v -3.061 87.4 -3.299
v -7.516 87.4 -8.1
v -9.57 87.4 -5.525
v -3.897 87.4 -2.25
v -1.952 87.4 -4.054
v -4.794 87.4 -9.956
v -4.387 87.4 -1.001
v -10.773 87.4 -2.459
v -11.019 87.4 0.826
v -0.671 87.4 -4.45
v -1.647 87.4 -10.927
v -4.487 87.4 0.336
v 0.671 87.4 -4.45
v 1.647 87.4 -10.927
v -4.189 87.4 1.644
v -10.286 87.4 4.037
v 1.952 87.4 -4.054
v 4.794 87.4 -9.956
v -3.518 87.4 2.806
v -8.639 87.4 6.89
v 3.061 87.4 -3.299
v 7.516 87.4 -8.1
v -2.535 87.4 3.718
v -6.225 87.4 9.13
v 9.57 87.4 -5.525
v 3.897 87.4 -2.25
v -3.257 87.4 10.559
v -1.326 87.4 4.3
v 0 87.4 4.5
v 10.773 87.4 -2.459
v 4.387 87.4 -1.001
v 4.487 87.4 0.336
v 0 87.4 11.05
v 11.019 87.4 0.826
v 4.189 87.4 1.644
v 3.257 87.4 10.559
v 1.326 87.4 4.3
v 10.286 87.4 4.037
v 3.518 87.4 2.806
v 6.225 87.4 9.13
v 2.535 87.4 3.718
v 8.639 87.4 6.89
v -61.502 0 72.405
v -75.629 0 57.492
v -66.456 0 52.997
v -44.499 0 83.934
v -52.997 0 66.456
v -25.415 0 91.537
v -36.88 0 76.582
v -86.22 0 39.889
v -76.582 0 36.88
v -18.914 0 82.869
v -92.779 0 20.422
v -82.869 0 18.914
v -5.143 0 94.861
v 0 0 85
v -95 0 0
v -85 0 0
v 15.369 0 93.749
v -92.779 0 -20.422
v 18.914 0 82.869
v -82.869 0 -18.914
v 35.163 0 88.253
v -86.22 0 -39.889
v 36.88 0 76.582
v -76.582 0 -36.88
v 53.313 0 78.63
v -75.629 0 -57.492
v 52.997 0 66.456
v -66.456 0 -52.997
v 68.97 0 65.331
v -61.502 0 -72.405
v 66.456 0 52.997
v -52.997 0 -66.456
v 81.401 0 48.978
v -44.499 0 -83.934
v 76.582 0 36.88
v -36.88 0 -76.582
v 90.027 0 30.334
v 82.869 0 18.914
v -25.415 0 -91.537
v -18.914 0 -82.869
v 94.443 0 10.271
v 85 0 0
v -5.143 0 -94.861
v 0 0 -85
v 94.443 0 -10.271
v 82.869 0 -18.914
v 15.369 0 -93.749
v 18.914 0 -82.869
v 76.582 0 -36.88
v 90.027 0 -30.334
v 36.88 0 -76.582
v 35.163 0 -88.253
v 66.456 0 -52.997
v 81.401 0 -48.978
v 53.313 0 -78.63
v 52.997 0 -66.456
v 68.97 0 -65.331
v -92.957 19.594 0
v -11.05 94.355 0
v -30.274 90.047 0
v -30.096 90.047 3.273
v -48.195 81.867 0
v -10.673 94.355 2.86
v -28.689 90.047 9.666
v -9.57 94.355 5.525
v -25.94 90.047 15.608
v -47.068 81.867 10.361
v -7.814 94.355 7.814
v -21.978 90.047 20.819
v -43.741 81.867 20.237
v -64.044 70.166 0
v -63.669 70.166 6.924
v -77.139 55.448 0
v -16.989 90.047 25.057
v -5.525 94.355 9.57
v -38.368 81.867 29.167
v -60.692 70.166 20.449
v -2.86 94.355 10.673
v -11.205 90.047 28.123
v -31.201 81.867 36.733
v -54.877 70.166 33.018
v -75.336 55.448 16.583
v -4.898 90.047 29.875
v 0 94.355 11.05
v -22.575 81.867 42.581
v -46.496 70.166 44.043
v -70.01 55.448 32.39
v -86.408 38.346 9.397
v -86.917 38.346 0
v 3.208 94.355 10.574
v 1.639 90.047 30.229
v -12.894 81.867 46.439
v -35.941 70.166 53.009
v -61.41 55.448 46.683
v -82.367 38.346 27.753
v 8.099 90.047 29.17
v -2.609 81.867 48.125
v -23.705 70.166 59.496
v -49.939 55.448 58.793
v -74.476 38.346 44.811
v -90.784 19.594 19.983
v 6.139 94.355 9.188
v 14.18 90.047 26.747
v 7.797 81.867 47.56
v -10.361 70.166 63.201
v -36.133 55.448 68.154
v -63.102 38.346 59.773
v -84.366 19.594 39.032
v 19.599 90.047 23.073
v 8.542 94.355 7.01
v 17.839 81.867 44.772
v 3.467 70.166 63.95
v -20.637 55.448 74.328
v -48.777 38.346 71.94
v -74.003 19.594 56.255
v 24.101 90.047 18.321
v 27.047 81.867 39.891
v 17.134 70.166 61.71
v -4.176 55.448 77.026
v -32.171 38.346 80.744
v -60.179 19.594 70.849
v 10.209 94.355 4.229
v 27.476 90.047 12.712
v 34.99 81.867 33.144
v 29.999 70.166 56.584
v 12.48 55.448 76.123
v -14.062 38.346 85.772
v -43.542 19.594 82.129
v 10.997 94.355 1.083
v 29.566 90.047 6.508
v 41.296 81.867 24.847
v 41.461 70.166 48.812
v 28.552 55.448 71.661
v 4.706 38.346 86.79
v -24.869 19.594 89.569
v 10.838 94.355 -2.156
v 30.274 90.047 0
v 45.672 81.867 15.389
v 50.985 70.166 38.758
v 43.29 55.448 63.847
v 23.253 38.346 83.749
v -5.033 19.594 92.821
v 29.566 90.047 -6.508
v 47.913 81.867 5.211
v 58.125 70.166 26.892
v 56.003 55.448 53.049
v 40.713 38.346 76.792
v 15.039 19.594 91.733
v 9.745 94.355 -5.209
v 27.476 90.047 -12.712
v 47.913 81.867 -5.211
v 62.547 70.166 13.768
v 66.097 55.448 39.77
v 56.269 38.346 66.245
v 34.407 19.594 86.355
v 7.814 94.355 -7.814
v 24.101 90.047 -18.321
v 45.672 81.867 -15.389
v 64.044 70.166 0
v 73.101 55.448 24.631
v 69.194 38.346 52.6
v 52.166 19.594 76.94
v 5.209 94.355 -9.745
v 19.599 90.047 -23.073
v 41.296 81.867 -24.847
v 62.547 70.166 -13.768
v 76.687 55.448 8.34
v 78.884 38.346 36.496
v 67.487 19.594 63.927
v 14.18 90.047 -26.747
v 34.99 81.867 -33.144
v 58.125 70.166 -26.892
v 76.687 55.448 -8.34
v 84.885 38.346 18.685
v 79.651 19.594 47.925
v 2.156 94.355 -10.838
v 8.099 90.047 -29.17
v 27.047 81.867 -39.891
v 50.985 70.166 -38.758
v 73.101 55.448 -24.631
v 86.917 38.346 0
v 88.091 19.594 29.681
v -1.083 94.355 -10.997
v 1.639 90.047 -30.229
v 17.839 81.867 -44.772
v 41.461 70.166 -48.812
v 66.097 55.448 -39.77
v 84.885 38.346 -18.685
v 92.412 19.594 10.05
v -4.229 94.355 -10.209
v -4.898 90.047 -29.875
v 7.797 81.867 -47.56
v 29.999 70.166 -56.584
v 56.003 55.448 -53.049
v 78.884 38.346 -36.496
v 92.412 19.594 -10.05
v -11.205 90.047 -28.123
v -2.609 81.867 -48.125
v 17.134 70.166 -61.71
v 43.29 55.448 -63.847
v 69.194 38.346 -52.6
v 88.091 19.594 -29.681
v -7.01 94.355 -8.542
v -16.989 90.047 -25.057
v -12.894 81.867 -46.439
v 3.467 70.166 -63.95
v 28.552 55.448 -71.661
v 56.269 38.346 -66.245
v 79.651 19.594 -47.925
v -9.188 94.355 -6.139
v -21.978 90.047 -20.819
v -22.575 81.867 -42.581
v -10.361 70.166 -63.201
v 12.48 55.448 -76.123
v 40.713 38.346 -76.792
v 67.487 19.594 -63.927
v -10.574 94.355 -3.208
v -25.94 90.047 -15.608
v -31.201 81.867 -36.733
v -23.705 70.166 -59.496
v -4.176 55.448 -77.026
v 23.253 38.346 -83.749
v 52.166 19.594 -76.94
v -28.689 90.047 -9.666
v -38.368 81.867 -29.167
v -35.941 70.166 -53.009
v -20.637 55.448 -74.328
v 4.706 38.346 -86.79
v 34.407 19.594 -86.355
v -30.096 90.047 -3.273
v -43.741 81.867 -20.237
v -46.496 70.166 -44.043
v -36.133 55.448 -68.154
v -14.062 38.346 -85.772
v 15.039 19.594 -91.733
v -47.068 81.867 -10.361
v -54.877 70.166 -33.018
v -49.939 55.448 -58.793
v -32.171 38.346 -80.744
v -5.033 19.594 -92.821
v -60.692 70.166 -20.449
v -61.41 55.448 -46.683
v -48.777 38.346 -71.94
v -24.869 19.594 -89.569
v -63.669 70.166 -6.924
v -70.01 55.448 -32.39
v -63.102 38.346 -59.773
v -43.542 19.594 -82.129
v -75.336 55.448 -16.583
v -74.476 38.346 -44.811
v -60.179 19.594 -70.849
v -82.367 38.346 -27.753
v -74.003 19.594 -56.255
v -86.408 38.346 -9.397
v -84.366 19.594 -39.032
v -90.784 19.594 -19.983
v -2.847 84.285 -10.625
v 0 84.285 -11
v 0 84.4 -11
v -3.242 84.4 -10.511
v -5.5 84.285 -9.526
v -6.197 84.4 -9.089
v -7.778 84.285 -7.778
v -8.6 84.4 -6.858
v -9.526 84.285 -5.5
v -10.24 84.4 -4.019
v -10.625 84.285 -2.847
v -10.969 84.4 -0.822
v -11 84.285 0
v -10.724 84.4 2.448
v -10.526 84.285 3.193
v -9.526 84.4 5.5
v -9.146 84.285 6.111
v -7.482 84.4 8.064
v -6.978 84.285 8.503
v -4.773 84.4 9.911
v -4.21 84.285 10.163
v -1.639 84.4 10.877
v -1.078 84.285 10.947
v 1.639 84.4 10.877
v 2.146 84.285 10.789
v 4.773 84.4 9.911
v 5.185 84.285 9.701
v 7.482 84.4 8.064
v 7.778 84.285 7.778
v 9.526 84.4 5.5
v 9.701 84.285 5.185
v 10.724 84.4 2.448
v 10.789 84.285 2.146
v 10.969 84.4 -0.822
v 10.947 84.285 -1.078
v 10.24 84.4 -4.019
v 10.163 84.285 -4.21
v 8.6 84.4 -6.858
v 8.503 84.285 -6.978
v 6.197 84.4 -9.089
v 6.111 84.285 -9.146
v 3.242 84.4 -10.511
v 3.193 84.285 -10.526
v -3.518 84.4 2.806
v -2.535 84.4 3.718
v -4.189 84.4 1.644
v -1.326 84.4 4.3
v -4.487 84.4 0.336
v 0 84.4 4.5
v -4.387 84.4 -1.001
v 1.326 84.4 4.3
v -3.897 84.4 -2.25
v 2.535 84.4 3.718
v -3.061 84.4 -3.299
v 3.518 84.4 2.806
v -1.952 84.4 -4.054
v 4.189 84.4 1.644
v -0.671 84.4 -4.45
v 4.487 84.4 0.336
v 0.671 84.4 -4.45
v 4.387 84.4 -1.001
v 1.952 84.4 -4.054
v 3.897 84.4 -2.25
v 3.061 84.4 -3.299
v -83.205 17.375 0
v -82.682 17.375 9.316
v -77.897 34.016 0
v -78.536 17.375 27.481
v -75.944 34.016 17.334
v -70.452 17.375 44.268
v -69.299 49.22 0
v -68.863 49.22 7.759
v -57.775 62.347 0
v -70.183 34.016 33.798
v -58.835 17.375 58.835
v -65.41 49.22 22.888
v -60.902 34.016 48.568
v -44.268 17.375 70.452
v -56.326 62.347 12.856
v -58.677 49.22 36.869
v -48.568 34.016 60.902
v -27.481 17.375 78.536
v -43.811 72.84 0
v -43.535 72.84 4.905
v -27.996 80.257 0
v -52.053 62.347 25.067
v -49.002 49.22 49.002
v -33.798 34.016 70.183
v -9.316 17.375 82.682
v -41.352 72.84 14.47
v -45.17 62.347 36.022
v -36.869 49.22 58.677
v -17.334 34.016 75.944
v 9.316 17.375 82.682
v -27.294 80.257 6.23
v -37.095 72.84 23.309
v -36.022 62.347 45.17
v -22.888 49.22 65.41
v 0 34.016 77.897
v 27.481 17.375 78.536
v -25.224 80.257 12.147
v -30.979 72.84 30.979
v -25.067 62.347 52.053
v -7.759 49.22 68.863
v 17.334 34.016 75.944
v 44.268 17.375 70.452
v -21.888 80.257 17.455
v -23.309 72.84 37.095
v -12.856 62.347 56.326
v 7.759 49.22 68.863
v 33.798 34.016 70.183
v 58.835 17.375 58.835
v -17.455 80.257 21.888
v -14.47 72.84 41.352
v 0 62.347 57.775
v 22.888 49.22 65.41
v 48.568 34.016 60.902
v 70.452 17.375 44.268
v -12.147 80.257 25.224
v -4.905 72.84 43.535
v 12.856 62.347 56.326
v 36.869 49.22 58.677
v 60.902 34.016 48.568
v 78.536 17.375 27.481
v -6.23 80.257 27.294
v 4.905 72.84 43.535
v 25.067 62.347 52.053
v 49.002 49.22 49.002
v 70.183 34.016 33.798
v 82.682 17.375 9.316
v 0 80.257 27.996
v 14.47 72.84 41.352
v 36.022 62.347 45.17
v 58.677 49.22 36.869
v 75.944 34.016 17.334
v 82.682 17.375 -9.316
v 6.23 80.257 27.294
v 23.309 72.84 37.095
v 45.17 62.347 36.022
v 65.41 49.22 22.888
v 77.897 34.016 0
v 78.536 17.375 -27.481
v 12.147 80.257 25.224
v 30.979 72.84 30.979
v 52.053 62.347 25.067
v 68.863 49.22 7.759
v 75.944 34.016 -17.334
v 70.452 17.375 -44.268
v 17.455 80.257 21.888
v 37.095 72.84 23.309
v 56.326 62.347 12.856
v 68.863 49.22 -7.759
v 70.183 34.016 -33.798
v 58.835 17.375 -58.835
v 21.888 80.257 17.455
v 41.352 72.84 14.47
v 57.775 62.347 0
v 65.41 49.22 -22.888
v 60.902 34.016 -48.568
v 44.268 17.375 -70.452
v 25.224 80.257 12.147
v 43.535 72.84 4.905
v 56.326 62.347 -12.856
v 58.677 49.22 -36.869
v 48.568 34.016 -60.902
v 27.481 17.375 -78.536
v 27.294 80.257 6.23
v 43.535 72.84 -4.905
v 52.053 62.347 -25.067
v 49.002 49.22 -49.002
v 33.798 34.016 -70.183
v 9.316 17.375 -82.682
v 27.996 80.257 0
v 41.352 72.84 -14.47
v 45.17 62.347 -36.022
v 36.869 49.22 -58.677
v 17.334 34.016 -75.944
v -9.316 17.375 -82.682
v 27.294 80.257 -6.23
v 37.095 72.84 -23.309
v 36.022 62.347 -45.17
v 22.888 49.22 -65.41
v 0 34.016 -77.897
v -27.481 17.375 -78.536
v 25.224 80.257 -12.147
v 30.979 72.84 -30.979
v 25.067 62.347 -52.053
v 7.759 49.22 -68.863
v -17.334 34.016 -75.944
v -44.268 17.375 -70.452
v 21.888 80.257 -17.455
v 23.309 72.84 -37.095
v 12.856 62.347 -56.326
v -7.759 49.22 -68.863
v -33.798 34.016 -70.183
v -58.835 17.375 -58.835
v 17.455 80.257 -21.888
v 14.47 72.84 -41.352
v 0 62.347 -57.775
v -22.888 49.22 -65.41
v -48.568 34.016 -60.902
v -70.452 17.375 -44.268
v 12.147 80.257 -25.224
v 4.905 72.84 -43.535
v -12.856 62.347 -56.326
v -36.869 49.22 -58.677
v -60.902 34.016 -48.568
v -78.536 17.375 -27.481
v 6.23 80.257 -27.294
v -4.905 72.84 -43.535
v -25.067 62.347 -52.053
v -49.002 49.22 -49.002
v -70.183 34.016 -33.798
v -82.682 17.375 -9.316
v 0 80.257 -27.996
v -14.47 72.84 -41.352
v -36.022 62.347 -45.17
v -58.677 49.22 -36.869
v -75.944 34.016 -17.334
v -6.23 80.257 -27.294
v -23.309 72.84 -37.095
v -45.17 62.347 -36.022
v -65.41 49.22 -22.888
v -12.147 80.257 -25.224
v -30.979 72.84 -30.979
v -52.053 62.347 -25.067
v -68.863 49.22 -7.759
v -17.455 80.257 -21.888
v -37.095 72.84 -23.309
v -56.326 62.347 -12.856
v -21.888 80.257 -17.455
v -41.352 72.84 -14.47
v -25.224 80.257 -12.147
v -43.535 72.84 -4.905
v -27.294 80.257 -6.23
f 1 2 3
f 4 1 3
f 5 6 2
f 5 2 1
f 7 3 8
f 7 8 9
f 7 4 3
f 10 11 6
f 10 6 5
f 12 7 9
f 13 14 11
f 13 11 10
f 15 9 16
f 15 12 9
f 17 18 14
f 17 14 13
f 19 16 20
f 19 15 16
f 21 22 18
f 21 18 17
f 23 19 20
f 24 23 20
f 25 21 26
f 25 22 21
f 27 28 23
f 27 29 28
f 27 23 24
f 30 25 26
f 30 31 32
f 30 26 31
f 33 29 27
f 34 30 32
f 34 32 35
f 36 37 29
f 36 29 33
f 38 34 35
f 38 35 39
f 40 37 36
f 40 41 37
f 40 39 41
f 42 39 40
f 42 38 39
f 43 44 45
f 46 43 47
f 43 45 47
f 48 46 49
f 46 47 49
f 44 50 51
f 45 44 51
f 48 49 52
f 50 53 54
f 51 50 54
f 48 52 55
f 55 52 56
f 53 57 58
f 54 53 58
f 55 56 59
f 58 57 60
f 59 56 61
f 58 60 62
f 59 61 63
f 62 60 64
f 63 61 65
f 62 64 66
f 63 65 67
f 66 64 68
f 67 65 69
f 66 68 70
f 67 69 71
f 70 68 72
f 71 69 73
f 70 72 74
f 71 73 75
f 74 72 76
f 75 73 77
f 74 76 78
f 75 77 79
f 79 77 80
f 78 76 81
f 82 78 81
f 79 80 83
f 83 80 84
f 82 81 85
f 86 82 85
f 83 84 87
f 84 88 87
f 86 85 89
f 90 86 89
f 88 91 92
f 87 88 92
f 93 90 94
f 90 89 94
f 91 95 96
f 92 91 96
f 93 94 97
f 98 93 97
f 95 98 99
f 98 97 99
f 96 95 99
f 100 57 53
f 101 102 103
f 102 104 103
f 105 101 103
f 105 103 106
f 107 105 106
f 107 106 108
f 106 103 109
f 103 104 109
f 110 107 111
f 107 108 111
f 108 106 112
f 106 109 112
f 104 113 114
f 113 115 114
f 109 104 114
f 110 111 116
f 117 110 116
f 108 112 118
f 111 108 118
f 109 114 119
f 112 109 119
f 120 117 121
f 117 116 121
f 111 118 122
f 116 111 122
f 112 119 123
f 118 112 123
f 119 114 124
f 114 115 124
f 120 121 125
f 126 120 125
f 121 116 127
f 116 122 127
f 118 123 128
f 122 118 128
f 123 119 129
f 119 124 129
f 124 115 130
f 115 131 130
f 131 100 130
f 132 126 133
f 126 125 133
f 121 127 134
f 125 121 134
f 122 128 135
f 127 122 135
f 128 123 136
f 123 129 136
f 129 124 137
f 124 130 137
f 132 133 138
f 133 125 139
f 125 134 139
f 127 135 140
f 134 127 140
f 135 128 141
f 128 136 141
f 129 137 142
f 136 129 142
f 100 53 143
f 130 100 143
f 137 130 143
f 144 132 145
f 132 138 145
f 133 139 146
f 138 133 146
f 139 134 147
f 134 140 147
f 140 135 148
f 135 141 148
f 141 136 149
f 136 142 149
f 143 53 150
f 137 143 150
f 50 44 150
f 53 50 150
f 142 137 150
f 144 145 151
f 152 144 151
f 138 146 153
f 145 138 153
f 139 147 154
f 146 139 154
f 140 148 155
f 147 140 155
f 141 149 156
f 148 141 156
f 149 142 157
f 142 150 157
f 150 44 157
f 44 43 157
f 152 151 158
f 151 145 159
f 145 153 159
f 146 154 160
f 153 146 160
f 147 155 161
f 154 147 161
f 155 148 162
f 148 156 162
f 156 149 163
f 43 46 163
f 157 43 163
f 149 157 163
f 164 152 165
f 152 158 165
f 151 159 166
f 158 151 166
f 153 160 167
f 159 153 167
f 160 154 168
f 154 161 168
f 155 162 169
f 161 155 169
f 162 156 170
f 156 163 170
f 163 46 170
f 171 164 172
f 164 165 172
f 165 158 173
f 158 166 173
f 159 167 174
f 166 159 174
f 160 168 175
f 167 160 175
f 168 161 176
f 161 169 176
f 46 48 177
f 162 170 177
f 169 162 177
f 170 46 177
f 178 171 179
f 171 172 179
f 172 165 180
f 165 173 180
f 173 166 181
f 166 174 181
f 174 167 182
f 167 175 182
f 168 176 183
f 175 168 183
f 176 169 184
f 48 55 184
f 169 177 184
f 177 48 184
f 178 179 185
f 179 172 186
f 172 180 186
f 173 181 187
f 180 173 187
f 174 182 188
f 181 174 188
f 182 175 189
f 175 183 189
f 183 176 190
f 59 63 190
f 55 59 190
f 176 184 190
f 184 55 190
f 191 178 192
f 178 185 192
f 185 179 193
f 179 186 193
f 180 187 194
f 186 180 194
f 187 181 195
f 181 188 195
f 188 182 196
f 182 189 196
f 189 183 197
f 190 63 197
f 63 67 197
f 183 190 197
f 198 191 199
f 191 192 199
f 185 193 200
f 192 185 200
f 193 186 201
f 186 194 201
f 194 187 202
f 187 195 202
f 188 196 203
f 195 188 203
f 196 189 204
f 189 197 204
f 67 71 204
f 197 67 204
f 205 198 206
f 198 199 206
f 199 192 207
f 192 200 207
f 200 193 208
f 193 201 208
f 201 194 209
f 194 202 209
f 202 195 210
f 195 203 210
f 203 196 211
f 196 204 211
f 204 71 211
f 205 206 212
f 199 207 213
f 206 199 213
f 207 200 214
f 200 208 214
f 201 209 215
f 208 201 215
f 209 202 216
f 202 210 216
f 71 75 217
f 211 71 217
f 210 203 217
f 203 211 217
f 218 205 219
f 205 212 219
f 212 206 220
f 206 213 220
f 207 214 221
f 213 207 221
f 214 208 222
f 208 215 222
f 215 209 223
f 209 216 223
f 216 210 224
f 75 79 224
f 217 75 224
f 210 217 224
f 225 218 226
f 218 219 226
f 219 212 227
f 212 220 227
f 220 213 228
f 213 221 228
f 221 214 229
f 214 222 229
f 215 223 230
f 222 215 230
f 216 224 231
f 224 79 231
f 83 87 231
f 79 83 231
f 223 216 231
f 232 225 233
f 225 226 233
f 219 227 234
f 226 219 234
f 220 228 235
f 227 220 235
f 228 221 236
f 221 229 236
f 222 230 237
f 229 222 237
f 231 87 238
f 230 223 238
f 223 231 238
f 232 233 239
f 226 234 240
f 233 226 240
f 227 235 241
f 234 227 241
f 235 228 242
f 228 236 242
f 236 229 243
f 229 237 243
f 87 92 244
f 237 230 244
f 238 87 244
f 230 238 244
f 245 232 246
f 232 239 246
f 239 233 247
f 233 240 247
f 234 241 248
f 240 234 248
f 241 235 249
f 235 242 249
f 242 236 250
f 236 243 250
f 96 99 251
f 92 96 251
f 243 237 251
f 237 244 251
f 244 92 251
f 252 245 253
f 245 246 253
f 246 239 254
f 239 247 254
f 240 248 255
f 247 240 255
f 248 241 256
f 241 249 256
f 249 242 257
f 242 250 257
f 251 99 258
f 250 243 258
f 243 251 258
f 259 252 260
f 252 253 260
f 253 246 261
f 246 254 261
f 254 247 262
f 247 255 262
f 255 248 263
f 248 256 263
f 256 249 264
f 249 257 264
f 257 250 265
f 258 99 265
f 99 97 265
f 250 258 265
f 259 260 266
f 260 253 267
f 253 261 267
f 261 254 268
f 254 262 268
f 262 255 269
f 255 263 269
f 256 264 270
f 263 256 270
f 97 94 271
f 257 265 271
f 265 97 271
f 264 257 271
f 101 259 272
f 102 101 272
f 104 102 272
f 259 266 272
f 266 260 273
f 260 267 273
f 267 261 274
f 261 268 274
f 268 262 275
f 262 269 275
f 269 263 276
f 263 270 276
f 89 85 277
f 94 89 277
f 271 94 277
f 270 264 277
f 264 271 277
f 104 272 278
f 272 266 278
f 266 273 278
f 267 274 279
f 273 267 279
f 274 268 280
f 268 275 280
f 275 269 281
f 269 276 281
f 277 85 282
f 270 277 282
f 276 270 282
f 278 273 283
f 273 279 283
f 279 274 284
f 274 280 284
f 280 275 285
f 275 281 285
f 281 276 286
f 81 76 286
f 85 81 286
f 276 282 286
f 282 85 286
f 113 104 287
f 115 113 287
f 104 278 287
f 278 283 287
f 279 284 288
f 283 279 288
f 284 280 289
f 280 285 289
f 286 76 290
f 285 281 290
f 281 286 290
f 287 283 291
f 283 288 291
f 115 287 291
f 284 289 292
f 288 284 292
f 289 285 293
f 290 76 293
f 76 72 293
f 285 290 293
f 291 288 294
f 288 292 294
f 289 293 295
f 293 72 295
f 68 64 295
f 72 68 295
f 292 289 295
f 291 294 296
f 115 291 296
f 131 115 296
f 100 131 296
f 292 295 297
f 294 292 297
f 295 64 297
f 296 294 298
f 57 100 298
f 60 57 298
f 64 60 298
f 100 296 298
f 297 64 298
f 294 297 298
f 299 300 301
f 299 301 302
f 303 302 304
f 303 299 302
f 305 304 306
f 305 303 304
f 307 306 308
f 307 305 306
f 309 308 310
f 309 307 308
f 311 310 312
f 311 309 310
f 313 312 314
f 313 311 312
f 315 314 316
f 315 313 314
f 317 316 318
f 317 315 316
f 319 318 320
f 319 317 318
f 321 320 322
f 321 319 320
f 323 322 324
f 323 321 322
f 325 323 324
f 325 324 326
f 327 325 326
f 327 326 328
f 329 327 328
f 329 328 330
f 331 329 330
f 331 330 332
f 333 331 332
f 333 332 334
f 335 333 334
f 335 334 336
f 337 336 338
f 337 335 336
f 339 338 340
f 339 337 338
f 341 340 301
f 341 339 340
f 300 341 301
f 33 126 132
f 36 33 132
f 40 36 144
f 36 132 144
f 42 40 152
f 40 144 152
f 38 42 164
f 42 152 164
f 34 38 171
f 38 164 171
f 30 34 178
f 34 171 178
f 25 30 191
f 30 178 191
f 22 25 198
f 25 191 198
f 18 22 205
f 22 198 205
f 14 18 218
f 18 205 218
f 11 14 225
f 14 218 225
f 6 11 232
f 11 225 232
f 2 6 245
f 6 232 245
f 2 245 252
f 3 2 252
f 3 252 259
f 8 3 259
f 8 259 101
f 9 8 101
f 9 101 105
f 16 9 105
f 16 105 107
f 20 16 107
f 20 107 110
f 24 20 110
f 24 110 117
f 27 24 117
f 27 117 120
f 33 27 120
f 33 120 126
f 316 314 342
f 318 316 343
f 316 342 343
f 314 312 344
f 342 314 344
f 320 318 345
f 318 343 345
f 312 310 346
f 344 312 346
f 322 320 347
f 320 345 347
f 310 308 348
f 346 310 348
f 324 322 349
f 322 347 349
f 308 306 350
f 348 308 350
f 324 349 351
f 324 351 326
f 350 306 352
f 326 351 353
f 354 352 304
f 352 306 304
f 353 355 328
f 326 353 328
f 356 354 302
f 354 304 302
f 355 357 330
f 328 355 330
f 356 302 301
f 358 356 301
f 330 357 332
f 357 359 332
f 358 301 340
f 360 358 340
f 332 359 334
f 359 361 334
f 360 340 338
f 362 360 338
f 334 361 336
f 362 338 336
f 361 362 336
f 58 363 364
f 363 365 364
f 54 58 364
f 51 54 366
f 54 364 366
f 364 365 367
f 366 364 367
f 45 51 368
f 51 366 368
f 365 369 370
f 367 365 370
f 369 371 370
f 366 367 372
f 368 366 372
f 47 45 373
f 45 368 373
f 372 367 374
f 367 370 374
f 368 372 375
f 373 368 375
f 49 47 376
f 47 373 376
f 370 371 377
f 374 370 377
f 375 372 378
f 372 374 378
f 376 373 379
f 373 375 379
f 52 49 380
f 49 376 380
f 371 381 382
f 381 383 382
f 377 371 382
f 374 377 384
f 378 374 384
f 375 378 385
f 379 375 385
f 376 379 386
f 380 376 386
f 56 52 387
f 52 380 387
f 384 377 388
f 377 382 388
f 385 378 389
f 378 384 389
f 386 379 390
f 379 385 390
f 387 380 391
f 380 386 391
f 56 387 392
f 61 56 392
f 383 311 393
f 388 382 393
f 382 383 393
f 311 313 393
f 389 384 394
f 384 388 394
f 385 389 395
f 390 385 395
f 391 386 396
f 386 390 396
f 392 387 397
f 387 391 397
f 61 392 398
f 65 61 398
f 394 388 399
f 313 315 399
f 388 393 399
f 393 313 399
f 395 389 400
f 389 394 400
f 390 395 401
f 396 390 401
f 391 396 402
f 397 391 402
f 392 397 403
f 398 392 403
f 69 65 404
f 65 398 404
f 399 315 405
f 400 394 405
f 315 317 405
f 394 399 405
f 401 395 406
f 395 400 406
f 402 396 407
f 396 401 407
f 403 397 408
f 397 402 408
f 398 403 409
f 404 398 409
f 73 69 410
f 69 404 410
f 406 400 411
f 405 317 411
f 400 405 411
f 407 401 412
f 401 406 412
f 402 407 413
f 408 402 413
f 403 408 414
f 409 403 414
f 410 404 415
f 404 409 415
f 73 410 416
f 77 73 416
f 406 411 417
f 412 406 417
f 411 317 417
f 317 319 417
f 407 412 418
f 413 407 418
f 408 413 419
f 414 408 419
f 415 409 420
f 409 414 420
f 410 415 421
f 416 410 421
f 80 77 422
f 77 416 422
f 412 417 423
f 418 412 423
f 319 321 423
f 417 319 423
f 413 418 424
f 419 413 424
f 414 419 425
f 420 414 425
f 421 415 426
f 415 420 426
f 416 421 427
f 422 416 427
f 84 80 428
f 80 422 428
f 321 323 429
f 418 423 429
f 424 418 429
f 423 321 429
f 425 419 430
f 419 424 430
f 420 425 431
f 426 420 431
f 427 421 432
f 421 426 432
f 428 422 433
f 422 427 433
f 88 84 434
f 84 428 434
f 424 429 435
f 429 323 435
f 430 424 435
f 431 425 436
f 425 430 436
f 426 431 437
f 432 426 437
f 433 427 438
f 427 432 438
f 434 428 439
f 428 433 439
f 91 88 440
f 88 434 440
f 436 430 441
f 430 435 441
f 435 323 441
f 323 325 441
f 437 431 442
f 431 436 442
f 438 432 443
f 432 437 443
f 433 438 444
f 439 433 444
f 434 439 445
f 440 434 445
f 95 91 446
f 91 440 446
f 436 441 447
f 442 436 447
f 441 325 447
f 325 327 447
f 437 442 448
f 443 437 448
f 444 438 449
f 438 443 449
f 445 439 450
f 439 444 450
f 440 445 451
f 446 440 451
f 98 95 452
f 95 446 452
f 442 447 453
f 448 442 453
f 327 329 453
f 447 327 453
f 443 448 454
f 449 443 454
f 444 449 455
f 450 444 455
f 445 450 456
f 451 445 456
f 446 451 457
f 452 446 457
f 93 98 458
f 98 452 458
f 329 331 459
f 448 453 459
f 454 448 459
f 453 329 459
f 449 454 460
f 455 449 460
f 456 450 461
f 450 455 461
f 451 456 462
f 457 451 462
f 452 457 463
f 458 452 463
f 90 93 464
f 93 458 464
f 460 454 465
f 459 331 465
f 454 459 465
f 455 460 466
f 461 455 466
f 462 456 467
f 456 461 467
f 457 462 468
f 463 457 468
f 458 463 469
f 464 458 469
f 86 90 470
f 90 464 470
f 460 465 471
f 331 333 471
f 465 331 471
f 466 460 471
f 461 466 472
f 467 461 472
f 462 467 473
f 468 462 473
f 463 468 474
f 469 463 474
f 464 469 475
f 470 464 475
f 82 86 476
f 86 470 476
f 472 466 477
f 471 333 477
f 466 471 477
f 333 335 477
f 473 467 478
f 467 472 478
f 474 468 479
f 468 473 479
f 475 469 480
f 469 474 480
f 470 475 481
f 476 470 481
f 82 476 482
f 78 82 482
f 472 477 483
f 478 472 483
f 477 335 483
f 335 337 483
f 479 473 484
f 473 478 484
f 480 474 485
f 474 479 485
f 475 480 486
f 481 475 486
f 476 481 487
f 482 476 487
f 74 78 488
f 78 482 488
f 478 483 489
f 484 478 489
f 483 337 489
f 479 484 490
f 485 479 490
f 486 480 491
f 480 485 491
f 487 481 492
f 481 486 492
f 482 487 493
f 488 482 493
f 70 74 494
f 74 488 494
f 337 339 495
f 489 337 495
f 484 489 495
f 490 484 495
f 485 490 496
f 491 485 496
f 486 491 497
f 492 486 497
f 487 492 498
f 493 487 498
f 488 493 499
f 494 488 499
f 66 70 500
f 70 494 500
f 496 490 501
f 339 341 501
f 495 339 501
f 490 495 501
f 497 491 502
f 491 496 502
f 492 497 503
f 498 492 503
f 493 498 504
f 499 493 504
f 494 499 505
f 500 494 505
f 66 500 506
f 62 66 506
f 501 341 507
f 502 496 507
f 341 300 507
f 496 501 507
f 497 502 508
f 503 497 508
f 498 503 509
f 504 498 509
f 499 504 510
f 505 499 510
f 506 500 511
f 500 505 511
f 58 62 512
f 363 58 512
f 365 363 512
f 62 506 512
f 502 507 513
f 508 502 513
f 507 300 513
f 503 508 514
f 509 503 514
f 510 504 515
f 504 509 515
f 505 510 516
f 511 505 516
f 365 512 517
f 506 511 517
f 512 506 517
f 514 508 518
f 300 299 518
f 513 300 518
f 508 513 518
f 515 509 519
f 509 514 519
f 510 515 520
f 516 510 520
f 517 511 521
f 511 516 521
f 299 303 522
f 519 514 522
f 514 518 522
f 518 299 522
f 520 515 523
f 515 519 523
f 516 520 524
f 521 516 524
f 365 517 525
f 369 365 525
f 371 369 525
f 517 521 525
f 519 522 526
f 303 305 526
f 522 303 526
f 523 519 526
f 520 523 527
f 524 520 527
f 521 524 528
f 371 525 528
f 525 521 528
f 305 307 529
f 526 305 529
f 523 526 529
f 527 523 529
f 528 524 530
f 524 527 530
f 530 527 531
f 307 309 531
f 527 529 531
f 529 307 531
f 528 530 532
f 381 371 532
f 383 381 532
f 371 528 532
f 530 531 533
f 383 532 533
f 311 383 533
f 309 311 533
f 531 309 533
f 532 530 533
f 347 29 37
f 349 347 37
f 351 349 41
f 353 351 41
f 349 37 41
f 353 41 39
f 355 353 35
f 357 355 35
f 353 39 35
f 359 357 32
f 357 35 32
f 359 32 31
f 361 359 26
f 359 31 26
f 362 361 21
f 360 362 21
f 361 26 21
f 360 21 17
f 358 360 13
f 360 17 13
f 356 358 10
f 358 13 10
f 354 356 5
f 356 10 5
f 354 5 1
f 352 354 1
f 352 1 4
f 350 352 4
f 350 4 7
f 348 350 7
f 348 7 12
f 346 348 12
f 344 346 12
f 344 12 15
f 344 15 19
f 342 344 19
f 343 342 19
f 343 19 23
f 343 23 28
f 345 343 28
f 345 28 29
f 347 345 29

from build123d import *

# Parameters (mm, degrees)
SKETCH2_W              = 242.645613954
SKETCH2_H              = 231.138030636
CUT_IN_HALF_DEPTH      = 165.544826719
SKETCH3_R              = 11
BALLBEARINGHOLE_DEPTH  = 165.544826719
SKETCH4_R              = 31.202879122
SUPPORTFORHOLE_DEPTH   = 4
SKETCH5_R              = 11.05
F_2NDBEARINGHOLE_DEPTH = 7
SKETCH6_R              = 4.5
INSIDEHOLE_DEPTH       = 161.277134988


with BuildPart() as part:
    # Half Circle → Sphere Revolve (revolve)
    with BuildSketch(Plane.XY):
        with BuildLine():
            Line((0, 85), (0, 95))
            ThreePointArc((0, 95), (-95, 0), (0, -95))
            Line((0, -95), (0, -85))
            ThreePointArc((0, -85), (-85, 0), (0, 85))
        make_face()
    revolve(axis=Axis((0, 85, 0), (0, 1, 0)))

    # Sketch2 → Cut in Half (cut, through all)
    with BuildSketch(Plane(origin=(0, 0, 0), x_dir=(1, 0, 0), z_dir=(0, 1, 0))):
        Rectangle(SKETCH2_W, SKETCH2_H)
    extrude(amount=-CUT_IN_HALF_DEPTH, mode=Mode.SUBTRACT)

    # Sketch3 → BallBearingHole (cut, through all)
    with BuildSketch(Plane(origin=(0, 0, 0), x_dir=(1, 0, 0), z_dir=(0, 1, 0))):
        with Locations(Location((0, 0, 0), (0, 0, 90))):
            Circle(SKETCH3_R)
    extrude(amount=BALLBEARINGHOLE_DEPTH, mode=Mode.SUBTRACT)

    # Sketch4 → SupportForHole (add)
    with BuildSketch(Plane(origin=(0, 84.4, 0), x_dir=(1, 0, 0), z_dir=(0, 1, 0))):
        Circle(SKETCH4_R)
    extrude(amount=SUPPORTFORHOLE_DEPTH)

    # Sketch5 → 2ndBearingHole (cut)
    with BuildSketch(Plane(origin=(0, 94.4, 0), x_dir=(1, 0, 0), z_dir=(0, 1, 0))):
        with Locations(Location((0, 0, 0), (0, 0, 270))):
            Circle(SKETCH5_R)
    extrude(amount=-F_2NDBEARINGHOLE_DEPTH, mode=Mode.SUBTRACT)

    # Sketch6 → InsideHole (cut, through all)
    with BuildSketch(Plane(origin=(0, 87.4, 0), x_dir=(1, 0, 0), z_dir=(0, 1, 0))):
        with Locations(Location((0, 0, 0), (0, 0, 270))):
            Circle(SKETCH6_R)
    extrude(amount=-INSIDEHOLE_DEPTH, mode=Mode.SUBTRACT)


solid = part.part
